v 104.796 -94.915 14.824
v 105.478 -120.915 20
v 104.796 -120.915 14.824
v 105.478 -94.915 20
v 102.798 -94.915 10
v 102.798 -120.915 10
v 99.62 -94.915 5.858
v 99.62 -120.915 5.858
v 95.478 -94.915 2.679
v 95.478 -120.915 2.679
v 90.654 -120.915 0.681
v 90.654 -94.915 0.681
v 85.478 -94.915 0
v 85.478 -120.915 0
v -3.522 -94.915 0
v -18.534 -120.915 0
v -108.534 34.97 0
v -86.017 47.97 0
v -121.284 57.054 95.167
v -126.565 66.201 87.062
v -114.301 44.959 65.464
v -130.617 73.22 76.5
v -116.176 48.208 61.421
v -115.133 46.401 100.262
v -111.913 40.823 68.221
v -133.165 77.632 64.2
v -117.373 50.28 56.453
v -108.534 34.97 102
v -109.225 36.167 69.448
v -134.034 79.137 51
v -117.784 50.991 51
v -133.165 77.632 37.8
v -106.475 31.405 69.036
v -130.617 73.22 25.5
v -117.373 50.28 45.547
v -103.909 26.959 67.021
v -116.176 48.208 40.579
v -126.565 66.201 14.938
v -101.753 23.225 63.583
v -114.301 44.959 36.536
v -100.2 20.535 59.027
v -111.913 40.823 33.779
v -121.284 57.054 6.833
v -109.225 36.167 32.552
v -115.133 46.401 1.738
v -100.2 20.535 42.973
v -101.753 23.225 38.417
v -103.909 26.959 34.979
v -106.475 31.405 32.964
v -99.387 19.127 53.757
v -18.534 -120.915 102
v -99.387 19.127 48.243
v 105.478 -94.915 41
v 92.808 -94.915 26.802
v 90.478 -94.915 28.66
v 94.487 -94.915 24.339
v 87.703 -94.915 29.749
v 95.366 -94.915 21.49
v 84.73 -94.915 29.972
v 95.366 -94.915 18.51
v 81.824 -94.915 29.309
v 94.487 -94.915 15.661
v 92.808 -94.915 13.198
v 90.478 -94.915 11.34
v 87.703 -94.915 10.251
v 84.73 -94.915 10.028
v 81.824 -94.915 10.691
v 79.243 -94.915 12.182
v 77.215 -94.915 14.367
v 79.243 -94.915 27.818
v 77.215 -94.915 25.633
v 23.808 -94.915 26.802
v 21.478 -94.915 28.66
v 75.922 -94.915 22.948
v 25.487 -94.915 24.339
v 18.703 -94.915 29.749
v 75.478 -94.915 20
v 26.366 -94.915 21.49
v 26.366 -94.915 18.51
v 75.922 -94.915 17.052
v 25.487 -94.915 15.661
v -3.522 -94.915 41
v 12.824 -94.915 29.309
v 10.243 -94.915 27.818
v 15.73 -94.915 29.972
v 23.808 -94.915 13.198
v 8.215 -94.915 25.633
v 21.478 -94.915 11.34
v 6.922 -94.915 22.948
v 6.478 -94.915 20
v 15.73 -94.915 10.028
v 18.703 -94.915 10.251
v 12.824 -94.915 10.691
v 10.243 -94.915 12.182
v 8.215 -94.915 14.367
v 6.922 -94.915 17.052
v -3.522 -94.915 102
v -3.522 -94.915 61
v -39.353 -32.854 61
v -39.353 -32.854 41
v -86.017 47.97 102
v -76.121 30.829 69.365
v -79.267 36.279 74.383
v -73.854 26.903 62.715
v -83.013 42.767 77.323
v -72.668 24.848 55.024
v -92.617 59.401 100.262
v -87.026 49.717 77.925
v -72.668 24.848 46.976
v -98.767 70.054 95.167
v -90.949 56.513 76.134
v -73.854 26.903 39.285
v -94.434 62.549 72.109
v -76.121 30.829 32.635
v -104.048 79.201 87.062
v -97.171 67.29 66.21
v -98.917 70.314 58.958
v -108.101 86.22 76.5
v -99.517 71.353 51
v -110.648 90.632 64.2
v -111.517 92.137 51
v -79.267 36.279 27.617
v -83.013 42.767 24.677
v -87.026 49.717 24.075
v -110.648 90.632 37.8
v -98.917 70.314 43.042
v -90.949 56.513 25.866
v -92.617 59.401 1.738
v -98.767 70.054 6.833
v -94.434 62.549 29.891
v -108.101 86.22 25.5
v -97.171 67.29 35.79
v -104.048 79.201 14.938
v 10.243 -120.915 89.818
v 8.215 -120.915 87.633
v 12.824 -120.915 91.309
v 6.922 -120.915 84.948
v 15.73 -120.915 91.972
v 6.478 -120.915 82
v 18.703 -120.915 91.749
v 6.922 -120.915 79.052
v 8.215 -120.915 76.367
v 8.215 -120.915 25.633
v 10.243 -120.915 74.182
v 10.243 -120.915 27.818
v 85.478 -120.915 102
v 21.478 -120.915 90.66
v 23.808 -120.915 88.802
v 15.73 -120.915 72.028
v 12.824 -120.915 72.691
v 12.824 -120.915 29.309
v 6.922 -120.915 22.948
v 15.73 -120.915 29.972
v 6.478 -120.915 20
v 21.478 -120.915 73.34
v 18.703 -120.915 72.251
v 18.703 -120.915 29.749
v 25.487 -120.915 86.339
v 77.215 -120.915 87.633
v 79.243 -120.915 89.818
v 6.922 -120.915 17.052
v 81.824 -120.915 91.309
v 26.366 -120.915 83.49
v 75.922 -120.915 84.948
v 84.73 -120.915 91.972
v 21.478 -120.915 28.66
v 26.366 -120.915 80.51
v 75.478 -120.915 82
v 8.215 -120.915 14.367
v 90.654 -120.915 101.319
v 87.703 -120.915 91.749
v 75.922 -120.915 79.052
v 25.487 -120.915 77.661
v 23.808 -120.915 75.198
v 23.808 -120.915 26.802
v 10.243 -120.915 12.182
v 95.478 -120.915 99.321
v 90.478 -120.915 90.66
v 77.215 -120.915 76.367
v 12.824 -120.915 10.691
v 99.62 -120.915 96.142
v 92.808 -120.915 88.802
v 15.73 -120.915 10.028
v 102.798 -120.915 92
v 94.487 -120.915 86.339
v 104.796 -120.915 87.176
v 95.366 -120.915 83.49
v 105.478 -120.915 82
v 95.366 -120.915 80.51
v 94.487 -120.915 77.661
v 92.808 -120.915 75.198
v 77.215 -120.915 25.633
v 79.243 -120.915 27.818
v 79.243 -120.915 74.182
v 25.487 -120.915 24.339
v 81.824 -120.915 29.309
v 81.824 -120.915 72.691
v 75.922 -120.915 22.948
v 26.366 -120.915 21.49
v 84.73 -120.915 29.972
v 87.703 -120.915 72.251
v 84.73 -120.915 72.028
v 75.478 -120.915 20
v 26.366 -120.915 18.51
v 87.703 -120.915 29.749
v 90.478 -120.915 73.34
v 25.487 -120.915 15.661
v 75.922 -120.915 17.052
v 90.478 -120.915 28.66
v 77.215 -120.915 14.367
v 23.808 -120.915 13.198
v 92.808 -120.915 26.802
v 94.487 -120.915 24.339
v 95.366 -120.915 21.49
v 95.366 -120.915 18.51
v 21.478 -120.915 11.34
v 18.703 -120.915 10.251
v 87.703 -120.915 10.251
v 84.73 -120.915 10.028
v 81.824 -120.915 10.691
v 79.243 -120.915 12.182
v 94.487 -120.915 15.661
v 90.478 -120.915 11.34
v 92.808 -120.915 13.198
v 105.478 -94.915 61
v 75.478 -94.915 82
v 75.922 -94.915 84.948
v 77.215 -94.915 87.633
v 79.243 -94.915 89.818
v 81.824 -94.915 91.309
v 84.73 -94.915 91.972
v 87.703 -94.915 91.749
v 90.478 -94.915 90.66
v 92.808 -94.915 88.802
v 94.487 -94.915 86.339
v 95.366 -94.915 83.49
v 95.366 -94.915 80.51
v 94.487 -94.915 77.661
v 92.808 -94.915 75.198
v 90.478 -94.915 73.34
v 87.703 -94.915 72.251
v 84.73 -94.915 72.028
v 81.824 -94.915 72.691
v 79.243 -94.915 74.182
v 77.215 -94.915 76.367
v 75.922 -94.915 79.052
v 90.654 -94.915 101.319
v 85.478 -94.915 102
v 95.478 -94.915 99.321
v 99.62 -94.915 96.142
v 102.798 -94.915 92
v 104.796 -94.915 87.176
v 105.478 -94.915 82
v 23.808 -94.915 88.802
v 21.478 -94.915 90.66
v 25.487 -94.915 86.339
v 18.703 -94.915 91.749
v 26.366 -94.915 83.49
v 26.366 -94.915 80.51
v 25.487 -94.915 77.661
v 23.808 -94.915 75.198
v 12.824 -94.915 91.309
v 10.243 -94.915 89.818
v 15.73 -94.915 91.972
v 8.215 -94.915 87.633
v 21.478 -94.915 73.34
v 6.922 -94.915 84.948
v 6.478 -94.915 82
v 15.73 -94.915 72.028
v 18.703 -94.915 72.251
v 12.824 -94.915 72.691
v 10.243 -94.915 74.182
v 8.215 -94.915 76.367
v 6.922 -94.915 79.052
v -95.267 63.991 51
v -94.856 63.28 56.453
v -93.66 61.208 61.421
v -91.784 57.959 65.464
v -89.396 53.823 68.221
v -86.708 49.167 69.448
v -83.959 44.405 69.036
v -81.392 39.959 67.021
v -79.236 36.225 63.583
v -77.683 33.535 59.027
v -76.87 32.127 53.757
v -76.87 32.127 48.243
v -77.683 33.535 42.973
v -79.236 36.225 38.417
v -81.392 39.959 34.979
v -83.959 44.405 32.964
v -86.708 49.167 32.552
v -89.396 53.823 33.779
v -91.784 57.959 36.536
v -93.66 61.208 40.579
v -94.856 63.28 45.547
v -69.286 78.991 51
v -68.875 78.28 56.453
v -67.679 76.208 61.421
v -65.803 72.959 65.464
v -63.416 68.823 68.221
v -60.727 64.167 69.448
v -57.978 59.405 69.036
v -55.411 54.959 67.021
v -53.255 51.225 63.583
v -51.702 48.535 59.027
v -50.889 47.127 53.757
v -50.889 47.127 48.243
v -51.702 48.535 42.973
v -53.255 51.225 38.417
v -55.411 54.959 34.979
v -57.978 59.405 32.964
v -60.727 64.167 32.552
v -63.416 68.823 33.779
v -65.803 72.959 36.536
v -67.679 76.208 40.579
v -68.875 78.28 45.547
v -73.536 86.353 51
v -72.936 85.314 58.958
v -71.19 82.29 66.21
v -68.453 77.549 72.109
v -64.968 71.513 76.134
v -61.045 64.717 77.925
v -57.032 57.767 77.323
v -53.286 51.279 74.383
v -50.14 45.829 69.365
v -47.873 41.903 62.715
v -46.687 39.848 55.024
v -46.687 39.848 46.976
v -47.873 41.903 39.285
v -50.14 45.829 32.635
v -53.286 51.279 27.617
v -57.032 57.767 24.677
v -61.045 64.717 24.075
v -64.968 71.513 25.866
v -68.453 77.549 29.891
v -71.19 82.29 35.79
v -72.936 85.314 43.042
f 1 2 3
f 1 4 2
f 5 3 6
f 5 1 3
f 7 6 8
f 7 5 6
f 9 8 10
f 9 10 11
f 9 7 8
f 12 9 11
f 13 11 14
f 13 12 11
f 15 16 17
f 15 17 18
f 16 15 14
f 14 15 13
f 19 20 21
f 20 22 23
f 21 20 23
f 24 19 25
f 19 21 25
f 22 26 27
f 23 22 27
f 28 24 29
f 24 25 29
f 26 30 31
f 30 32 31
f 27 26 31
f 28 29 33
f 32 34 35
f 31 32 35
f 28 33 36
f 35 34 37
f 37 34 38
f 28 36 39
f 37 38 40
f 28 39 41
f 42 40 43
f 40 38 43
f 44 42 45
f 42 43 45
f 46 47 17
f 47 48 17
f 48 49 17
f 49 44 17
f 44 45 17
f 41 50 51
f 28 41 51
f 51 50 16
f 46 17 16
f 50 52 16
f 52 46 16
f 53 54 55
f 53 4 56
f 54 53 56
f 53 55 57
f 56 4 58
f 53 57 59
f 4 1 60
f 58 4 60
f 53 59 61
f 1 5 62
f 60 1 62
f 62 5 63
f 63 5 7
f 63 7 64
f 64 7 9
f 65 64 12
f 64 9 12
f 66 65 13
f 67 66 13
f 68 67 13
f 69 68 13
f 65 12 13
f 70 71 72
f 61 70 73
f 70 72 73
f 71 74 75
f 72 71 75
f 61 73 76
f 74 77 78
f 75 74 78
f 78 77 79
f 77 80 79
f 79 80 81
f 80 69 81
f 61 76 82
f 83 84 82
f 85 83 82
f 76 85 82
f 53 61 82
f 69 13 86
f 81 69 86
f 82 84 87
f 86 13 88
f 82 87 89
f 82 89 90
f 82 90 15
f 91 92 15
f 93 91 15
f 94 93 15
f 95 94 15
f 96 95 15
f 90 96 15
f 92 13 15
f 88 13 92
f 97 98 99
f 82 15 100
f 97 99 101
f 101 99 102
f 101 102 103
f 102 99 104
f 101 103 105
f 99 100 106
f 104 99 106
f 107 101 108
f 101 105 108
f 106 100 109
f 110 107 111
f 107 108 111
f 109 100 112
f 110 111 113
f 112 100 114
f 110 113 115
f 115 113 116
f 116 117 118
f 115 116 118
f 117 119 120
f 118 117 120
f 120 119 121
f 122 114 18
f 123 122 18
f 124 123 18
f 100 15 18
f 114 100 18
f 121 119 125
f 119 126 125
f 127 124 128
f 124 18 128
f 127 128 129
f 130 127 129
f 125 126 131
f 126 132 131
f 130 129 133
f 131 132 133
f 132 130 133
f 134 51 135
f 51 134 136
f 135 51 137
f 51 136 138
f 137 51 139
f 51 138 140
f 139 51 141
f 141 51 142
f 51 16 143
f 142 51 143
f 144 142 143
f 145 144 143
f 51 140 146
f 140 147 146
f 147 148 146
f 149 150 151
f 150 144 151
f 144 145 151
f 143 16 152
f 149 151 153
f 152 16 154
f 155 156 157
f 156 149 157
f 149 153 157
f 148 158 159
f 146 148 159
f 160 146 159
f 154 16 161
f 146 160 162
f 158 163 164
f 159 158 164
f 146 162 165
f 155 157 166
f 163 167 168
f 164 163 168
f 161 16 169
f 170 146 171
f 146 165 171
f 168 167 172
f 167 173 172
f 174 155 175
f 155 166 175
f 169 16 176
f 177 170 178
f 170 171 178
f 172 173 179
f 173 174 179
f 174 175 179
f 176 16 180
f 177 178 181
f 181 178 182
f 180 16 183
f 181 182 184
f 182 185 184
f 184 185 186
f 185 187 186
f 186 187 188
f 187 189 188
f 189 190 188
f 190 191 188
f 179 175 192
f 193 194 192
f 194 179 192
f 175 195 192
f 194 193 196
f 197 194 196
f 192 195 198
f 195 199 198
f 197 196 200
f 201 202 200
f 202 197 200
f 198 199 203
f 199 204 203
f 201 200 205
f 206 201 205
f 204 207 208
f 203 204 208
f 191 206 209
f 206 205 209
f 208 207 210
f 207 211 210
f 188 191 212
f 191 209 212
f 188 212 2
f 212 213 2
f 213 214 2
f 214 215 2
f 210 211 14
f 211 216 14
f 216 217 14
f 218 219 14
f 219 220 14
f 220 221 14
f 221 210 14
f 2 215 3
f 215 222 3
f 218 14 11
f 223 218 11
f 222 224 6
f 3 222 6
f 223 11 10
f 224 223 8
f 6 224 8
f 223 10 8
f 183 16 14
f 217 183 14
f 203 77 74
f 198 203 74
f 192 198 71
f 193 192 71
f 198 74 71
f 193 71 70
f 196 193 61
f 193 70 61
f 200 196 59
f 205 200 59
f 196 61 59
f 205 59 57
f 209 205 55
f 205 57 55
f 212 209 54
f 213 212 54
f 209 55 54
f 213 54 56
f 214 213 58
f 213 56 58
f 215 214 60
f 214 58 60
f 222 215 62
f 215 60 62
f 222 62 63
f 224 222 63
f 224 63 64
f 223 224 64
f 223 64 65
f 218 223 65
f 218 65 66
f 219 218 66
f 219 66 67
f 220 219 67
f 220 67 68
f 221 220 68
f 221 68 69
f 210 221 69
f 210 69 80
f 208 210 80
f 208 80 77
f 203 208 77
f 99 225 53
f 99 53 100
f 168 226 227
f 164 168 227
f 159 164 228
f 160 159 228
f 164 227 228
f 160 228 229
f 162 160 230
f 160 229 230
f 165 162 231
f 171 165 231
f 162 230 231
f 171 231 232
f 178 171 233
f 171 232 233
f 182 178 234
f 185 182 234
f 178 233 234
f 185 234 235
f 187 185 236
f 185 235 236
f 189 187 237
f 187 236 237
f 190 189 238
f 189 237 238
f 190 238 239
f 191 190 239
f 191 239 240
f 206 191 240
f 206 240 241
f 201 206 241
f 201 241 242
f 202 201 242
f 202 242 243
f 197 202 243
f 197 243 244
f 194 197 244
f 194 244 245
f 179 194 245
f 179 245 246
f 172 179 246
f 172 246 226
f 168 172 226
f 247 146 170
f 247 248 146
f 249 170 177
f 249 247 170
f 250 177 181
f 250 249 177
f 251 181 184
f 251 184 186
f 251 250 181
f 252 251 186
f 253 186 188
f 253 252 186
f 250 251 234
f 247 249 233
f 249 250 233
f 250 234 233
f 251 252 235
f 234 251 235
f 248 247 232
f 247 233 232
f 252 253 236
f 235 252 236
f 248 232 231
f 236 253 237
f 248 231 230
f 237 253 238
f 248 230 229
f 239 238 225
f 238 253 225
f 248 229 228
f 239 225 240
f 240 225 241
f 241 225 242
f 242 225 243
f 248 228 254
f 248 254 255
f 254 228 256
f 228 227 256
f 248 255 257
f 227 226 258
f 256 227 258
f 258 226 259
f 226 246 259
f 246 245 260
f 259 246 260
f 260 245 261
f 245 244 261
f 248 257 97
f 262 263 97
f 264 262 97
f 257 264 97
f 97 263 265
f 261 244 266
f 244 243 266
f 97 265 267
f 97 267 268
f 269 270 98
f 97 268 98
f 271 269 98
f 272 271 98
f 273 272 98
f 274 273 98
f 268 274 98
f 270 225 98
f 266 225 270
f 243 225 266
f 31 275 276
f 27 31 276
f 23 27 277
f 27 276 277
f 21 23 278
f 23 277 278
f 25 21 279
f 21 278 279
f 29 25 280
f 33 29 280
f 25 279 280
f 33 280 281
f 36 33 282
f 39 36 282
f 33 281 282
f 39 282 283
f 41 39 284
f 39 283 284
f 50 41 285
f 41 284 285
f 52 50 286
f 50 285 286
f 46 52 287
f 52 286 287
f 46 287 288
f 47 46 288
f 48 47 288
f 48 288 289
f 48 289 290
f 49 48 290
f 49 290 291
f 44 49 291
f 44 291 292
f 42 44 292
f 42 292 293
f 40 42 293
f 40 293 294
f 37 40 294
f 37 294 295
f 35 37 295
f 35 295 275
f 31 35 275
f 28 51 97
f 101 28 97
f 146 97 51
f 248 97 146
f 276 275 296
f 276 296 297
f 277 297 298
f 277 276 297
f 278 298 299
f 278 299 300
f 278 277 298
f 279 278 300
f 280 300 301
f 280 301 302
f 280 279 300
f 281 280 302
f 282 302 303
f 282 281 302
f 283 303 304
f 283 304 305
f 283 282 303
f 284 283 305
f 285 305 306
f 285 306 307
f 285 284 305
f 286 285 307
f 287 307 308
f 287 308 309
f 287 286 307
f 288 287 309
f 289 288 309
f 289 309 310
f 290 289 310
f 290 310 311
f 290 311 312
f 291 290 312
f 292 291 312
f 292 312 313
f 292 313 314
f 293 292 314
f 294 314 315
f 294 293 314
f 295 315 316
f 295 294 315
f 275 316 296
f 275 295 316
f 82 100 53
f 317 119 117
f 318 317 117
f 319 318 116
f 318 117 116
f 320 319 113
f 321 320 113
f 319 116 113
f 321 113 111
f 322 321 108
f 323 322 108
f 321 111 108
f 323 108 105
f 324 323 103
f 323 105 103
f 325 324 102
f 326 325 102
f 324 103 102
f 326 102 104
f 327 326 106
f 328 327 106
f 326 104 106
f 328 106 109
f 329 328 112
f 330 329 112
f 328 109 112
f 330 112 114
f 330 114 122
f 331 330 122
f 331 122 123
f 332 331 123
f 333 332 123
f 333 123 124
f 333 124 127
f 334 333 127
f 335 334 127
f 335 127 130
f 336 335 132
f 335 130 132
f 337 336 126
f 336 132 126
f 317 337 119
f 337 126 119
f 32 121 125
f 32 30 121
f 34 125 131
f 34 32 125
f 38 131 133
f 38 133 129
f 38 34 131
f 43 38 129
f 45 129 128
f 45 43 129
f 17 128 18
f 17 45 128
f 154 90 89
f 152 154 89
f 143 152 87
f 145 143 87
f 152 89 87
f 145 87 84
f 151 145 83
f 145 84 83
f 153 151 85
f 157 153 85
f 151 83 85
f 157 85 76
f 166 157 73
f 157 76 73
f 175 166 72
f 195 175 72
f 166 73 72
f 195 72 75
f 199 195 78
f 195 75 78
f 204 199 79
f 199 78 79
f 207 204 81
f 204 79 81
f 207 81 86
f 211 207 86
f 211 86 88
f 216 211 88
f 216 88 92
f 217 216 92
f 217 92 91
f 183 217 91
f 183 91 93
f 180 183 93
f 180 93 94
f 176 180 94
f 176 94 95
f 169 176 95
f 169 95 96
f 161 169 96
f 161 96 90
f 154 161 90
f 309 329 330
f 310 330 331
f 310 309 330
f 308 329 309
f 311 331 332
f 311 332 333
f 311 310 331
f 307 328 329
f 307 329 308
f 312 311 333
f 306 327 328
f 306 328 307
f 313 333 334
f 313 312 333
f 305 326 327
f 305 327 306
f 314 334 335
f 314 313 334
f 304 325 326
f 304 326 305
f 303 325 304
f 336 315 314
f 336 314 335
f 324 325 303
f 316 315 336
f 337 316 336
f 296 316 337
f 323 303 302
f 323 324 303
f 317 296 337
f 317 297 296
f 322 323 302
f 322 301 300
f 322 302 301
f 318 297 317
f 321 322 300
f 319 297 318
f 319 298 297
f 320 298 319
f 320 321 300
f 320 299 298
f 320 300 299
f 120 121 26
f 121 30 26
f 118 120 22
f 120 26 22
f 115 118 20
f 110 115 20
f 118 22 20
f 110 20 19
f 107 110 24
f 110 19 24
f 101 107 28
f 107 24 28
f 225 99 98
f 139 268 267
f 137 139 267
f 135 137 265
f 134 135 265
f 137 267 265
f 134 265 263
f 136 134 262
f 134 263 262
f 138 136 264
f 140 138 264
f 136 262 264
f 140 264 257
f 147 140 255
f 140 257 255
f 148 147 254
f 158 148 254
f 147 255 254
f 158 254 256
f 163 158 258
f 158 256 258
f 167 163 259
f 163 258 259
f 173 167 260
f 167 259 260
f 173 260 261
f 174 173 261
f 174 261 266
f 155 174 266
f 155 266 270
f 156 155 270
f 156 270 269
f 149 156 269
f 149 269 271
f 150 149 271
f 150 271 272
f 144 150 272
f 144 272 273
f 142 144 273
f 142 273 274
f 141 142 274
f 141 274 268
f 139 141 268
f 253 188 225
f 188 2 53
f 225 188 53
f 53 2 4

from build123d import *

# Parameters (mm, degrees)
F1_DEPTH  = 102
F2_R      = 50.99999
F3_R      = 27
F3_R_2    = 18.5
F4_DEPTH  = 30
F8_DEPTH  = 10
F5_R      = 10
F9_DEPTH  = 30
F10_R     = 18.5
F11_DEPTH = 30
F12_R     = 20
F13_R     = 20


# Not quite as in the source:
# - a fillet or chamfer is up to 0.001 mm smaller than in the source, because OpenCascade refuses the exact size


with BuildPart() as f1:
    # F0 (on Top) → F1 (new body)
    with BuildSketch(Plane.XY):
        Polygon((-3.5224159509, -94.9145984159), (-111.5168624514, 92.1372698583), (-134.0335229498, 79.1372698583), (-18.5335229498, -120.9145984159), (105.4775840491, -120.9145984159), (105.4775840491, -94.9145984159), align=None)
    extrude(amount=F1_DEPTH)

    # F2 (radius 51 in the source; OpenCascade refuses exactly that, so slightly less here)
    f2_edges = [f1.edges().sort_by_distance(p)[0] for p in [
        (-122.775193, 85.63727, 102),
        (-122.775193, 85.63727, 0),
    ]]
    fillet(f2_edges, radius=F2_R)

    # F3 (on face) → F4 (join)
    with BuildSketch(Plane(origin=(-43.7410386722, -25.253900452, 0), x_dir=(-0.5, 0.8660254038, 0), z_dir=(0.8660254038, 0.5, 0))):
        with Locations((84.5516475584, 51)):
            Circle(F3_R)
        with Locations((84.5516475584, 51)):
            Circle(F3_R_2, mode=Mode.SUBTRACT)
    extrude(amount=F4_DEPTH)

    # F7 (on offset) → F8 (join, symmetric)
    with BuildSketch(Plane.XY.offset(51)):
        Polygon((-3.5224159509, -94.9145984159), (105.4775840491, -94.9145984159), (-44.2564783831, -30.7528017003), align=None)
    extrude(amount=F8_DEPTH, both=True)

    # F5 (on face) → F9 (cut)
    with BuildSketch(Plane(origin=(0, -94.9145984159, 0), x_dir=(-1, 0, 0), z_dir=(0, 1, 0))):
        with Locations((-85.4775840491, 82)):
            Circle(F5_R)
        with Locations((-85.4775840491, 20)):
            Circle(F5_R)
        with Locations((-16.4775840491, 82)):
            Circle(F5_R)
        with Locations((-16.4775840491, 20)):
            Circle(F5_R)
    extrude(amount=-F9_DEPTH, mode=Mode.SUBTRACT)

    # F10 (on face) → F11 (cut)
    with BuildSketch(Plane(origin=(-43.7410386722, -25.253900452, 0), x_dir=(-0.5, 0.8660254038, 0), z_dir=(0.8660254038, 0.5, 0))):
        with Locations((84.5516475584, 51)):
            Circle(F10_R)
    extrude(amount=-F11_DEPTH, mode=Mode.SUBTRACT)

    # F12
    f12_edges = [f1.edges().sort_by_distance(p)[0] for p in [
        (105.477584, -107.914598, 102),
    ]]
    fillet(f12_edges, radius=F12_R)

    # F13
    f13_edges = [f1.edges().sort_by_distance(p)[0] for p in [
        (105.477584, -107.914598, 0),
    ]]
    fillet(f13_edges, radius=F13_R)


solid = f1.part
